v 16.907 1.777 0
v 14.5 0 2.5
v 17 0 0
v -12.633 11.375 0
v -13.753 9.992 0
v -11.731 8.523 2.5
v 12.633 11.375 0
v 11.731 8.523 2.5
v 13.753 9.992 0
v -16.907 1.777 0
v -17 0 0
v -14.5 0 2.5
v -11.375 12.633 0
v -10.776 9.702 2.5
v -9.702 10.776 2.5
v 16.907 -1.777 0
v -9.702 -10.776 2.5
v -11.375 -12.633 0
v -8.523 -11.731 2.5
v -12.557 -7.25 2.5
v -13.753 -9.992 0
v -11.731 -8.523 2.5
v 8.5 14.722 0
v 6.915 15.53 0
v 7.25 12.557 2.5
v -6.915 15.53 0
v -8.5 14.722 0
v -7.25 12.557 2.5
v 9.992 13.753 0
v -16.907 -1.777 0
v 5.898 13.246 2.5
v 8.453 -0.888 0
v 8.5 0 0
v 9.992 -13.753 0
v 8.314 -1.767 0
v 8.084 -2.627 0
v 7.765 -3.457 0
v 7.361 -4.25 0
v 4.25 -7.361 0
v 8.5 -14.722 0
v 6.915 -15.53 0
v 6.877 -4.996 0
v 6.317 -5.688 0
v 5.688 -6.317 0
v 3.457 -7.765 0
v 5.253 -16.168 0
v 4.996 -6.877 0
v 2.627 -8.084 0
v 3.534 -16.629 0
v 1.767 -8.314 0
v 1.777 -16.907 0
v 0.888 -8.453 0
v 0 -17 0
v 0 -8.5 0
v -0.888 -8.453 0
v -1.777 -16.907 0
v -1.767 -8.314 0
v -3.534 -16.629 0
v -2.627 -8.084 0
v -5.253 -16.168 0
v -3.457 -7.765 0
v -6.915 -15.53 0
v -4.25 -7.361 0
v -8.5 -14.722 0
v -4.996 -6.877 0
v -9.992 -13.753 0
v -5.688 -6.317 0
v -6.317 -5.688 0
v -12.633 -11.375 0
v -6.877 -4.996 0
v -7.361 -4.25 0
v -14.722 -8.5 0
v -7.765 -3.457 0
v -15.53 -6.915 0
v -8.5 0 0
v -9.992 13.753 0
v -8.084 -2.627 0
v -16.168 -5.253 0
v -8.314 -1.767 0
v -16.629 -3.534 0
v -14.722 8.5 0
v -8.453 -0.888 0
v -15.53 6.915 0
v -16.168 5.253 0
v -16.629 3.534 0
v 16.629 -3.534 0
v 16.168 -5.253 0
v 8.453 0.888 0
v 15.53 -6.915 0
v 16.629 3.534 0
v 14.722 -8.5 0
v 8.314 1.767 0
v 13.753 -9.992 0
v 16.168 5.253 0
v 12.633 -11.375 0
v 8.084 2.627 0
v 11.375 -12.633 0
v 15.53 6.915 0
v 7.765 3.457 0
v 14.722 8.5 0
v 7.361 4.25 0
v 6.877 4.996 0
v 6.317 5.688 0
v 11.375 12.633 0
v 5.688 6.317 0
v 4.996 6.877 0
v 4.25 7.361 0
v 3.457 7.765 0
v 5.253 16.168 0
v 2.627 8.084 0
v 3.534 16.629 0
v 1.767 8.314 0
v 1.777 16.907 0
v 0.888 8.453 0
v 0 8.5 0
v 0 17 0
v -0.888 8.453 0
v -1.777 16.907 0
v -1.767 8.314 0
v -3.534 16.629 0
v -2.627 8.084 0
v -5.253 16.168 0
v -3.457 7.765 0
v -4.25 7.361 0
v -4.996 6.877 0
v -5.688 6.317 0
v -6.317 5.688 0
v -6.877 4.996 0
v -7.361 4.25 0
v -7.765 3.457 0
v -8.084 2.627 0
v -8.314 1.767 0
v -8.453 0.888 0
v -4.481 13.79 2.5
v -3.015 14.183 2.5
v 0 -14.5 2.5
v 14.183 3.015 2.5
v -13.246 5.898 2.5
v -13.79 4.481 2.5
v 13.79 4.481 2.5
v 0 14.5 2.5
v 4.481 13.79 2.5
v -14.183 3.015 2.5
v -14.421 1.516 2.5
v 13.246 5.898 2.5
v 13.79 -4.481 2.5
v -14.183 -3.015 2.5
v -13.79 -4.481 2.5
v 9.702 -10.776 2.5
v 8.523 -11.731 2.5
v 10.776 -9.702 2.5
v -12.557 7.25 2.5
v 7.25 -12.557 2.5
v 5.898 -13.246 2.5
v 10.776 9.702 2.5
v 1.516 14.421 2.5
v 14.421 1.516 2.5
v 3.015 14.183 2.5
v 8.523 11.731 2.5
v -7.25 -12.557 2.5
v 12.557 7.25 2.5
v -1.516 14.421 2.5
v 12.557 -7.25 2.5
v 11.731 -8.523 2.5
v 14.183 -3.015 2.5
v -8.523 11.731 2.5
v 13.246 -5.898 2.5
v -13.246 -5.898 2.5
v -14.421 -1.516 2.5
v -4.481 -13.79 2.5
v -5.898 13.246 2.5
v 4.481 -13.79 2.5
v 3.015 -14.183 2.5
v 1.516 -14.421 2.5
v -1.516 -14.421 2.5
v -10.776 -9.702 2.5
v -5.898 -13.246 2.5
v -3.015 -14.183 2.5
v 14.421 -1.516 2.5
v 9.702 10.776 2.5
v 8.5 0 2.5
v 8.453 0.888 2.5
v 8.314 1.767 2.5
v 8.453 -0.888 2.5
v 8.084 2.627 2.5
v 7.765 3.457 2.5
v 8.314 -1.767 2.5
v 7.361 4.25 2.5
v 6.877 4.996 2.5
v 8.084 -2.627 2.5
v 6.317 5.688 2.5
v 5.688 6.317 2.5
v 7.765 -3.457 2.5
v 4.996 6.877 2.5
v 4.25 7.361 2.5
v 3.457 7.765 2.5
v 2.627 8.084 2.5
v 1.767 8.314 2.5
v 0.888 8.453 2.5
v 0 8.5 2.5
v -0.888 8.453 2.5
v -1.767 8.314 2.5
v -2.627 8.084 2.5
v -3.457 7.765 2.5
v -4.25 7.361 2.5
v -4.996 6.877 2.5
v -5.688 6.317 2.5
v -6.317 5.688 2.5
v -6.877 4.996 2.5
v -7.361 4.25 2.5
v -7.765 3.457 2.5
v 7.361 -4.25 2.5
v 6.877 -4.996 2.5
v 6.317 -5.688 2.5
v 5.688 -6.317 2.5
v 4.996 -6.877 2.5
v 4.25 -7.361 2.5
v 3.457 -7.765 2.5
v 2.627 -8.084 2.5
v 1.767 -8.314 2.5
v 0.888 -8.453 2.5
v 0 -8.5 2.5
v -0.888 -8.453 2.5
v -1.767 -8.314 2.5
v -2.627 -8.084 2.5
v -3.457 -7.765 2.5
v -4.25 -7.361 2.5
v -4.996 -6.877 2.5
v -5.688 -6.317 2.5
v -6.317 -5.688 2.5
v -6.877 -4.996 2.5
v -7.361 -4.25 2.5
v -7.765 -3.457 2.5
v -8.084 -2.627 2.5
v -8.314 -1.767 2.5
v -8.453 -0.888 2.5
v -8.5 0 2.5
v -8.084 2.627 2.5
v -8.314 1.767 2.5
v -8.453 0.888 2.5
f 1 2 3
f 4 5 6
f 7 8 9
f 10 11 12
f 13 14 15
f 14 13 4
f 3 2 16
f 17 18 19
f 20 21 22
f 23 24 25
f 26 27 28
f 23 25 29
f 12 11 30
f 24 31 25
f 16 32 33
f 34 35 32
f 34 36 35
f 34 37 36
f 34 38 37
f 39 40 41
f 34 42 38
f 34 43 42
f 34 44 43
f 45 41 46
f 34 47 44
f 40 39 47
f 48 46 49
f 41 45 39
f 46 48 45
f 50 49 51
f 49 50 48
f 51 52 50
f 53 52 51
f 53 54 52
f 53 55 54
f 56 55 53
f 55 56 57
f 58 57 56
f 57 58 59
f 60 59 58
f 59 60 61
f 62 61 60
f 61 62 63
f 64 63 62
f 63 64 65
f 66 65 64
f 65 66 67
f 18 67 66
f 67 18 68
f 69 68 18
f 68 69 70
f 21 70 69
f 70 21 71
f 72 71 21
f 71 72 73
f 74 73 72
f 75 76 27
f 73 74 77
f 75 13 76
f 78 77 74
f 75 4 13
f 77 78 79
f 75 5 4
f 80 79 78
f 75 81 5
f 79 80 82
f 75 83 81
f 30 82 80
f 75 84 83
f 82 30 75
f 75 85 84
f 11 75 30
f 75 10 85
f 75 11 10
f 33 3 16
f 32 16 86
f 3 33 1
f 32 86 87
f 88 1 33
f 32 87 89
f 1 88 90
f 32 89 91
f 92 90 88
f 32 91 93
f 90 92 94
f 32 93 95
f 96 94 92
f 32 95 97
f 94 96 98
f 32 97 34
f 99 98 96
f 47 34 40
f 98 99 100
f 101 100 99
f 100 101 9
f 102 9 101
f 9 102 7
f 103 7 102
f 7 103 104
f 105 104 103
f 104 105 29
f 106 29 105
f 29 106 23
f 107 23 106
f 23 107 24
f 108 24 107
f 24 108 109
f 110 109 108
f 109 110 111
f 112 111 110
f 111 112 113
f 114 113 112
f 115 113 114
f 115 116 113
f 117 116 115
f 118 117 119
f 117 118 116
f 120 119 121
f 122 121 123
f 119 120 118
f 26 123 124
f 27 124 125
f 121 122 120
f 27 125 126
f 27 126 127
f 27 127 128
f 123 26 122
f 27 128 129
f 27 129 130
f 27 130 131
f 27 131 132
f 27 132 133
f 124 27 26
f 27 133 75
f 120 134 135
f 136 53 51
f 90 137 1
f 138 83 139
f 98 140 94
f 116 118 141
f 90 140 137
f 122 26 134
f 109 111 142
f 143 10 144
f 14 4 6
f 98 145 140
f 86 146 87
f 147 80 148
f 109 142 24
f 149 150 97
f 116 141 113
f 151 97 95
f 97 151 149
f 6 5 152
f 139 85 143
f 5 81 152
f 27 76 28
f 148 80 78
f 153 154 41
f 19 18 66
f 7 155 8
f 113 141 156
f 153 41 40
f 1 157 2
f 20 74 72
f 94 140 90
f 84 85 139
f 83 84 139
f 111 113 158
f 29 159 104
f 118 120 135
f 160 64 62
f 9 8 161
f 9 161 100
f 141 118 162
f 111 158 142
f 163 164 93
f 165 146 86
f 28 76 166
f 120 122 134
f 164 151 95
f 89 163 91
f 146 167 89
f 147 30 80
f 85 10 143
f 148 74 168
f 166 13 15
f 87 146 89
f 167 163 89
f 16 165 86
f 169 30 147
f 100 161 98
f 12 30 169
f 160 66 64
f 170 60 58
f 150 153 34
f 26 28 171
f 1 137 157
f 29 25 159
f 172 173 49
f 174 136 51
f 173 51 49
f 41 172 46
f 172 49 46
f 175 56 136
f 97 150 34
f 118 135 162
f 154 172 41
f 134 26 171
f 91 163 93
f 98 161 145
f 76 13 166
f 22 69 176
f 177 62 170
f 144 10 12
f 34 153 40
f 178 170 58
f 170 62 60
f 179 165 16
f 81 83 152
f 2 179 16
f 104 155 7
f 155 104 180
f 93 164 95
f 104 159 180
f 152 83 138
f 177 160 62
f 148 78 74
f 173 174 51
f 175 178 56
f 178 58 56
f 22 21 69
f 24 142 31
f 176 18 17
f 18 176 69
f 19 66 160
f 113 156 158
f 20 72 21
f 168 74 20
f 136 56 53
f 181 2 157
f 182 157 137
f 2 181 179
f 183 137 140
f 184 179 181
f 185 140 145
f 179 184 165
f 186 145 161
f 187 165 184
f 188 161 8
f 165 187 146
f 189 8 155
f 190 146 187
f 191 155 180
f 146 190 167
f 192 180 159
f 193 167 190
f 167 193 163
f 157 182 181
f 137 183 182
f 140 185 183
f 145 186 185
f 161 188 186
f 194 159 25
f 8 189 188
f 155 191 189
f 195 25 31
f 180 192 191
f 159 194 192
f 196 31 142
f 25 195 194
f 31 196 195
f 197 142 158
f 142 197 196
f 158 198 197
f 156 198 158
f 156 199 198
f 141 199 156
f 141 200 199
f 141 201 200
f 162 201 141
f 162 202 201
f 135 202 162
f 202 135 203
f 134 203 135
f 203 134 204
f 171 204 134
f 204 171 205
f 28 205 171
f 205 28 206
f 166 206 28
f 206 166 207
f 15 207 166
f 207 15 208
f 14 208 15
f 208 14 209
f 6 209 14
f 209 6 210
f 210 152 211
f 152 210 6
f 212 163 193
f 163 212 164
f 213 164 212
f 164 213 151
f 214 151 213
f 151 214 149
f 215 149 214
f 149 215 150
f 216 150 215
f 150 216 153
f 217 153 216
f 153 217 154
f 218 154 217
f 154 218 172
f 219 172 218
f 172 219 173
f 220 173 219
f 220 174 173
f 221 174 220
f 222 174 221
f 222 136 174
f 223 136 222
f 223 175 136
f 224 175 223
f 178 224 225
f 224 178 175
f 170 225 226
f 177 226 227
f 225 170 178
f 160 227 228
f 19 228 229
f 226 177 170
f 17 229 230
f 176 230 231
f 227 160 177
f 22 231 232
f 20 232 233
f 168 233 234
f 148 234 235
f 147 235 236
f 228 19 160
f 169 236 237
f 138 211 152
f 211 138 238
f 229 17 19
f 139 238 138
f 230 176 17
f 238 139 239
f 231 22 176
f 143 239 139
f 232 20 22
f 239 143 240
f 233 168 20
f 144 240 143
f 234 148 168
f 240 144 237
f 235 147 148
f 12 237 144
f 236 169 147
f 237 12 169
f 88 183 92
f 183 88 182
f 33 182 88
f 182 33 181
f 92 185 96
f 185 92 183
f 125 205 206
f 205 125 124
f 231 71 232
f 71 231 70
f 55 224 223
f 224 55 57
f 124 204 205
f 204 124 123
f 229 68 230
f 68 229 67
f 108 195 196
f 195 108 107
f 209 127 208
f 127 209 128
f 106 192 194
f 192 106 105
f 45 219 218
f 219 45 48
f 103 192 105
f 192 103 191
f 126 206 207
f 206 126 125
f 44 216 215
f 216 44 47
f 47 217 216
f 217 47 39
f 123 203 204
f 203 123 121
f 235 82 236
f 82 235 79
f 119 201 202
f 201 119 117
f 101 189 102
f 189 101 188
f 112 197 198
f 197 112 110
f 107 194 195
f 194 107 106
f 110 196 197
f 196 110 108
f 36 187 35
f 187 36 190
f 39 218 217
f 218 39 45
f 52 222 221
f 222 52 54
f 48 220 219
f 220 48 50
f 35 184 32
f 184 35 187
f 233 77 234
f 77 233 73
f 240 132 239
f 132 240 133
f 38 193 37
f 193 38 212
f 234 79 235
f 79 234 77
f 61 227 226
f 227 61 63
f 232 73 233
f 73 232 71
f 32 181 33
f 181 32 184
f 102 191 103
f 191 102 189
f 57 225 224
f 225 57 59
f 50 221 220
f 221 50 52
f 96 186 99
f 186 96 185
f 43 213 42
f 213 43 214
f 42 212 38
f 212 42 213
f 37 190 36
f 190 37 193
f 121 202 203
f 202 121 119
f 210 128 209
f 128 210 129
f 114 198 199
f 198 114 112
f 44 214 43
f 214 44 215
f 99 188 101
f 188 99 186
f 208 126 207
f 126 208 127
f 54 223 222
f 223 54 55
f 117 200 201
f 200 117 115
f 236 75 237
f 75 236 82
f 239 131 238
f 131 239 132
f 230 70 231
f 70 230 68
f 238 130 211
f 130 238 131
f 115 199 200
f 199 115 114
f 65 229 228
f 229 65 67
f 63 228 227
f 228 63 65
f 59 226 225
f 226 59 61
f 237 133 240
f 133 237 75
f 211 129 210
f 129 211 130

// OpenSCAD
// Conical spring washer.
$fn = 60;
eps = 0.02;
inner_d = 17;
outer_d = 34;
thickness = 2.5;
difference() {
    cylinder(d1=outer_d,d2=outer_d-2*thickness,h=thickness);
    translate([0,0,-eps]) cylinder(d=inner_d,h=thickness+2*eps);
}
